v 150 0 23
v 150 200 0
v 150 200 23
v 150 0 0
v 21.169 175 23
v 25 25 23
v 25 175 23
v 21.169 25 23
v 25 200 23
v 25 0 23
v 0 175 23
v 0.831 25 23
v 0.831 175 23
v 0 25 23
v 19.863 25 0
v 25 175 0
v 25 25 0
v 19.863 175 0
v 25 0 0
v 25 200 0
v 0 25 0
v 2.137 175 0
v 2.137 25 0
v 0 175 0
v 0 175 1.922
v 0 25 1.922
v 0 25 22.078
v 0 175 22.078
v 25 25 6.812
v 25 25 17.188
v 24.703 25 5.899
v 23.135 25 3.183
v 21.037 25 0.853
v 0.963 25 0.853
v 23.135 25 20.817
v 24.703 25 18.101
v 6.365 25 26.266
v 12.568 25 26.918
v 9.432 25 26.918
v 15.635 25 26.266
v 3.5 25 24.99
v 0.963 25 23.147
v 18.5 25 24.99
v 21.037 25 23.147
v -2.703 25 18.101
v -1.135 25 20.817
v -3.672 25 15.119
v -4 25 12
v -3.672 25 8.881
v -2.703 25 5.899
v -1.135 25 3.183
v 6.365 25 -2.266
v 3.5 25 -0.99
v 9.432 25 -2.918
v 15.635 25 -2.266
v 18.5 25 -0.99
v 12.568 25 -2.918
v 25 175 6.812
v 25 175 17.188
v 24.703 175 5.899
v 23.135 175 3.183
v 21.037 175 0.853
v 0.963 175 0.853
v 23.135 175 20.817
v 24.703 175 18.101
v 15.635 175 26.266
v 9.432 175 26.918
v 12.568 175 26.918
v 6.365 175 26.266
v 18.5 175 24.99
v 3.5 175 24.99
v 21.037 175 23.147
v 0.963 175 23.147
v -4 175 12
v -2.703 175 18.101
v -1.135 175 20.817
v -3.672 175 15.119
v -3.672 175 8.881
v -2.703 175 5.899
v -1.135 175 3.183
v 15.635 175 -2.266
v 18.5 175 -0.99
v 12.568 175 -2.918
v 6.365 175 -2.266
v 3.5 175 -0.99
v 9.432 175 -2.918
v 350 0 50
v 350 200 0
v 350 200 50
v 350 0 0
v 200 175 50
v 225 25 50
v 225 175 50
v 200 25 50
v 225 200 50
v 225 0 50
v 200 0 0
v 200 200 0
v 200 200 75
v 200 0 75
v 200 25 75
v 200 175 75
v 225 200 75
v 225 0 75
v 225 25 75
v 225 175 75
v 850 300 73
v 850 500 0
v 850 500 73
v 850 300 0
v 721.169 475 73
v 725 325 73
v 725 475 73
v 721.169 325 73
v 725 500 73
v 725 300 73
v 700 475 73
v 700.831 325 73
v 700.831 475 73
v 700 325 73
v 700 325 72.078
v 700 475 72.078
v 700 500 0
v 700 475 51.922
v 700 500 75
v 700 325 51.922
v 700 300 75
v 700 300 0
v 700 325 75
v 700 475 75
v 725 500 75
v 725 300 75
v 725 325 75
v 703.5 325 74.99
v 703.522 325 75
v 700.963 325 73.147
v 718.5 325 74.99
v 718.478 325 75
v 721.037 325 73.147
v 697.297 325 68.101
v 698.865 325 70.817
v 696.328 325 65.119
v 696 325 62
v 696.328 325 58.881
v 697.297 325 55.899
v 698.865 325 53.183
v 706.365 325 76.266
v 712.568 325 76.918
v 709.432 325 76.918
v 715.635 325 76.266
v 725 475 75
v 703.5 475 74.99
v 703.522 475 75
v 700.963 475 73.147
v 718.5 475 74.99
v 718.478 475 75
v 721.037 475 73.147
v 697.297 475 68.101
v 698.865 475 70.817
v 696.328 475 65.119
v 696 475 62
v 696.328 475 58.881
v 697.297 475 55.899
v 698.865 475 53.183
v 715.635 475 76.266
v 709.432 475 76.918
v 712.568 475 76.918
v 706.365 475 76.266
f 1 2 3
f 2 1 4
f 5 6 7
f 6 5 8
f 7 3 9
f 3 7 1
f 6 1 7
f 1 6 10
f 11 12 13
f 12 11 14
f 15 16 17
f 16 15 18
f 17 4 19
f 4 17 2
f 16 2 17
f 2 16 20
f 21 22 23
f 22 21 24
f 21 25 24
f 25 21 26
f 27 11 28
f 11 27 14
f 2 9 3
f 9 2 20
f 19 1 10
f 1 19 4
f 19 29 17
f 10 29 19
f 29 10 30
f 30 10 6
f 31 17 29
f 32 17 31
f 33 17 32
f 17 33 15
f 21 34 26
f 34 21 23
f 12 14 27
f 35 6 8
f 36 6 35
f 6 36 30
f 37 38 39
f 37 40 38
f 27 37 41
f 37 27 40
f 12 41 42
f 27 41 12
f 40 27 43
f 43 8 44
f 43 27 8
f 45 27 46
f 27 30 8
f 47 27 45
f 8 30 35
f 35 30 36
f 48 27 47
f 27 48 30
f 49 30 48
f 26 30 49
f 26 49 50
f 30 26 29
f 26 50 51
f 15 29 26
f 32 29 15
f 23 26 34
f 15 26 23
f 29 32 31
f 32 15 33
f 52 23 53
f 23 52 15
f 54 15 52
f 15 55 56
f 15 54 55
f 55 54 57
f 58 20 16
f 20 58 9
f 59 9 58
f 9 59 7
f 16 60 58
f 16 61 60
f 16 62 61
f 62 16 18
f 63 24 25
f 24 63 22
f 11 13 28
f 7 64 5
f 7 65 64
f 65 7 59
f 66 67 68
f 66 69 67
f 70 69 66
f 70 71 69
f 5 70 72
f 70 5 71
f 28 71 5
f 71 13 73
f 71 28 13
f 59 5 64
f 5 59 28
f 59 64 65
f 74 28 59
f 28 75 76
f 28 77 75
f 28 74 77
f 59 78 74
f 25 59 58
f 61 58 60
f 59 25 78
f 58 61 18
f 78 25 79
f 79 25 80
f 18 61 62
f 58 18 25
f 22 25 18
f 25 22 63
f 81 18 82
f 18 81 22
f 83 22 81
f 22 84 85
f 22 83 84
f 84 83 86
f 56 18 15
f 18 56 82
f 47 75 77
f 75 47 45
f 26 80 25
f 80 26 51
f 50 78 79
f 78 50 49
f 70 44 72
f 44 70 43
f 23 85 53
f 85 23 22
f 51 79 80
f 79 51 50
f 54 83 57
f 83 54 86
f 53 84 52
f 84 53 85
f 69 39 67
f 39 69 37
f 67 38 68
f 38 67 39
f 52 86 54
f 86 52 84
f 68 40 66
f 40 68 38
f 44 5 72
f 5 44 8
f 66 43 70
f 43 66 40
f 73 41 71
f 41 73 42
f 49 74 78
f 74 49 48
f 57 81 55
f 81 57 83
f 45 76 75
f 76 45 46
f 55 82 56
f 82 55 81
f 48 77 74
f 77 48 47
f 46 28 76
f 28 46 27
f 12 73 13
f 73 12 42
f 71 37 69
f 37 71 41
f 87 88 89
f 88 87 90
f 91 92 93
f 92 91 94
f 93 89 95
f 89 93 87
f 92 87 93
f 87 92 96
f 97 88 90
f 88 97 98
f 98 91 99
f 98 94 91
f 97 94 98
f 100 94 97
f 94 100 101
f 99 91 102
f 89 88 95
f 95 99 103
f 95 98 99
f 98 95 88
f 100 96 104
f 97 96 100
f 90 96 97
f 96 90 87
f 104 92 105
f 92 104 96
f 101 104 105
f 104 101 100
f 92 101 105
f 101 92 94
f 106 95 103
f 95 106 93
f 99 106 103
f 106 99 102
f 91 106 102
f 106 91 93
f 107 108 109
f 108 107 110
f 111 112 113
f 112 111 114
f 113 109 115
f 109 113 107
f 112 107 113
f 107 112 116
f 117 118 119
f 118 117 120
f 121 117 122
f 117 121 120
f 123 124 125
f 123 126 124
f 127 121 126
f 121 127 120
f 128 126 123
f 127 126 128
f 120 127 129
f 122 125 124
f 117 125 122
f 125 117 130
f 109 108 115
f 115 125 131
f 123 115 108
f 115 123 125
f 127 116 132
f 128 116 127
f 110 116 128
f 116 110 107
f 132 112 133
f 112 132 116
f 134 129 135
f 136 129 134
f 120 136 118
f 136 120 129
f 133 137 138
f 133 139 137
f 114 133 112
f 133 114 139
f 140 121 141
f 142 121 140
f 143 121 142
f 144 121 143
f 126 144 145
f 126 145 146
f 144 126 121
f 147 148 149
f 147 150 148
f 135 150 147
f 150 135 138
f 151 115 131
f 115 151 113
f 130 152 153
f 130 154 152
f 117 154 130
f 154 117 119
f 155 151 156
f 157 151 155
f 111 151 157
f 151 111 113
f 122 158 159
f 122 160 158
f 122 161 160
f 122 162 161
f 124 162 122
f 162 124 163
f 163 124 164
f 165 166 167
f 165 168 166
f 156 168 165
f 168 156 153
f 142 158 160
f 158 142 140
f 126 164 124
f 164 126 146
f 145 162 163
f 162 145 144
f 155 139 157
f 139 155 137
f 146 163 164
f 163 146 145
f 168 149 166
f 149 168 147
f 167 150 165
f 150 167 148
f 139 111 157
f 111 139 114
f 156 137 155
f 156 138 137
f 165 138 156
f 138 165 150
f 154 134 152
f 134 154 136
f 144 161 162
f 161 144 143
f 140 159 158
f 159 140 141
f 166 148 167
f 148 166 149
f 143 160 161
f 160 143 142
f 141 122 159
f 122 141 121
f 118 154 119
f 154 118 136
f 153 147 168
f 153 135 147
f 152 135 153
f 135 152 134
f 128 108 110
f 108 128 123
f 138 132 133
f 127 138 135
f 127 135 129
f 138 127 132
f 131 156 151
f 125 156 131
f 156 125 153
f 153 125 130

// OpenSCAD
module lid() { //still need rod to connect lid to body
    
    difference() { //upper lid edge
        difference() {
            cube([150,200,23]);
            cube([25,25,25]);
            translate([0,175,0]){
                cube([25,25,25]);
            }
        }
        polyhedron(
            points=[ [25,5,23],[25,195,23],[145,5,23],[145,195,23], [25,0,18],[25,200,18],[150,0,18],[150,200,18], [25,0,23], [25,200,23], [150,0,23], [150,200,23] ],                             
            faces=[ [4,0,2,6],[6,2,3,7],[7,3,1,5],[0,8,4],[1,5,9],[0,2,10,8],[8,10,6,4],[2,3,11,10],[10,11,7,6],[11,3,1,9],[11,9,5,7],[0,2,6,4] ]
         );
    }
    union() { //rounded rear edge of lid
        translate([11,25,12]){
            rotate(a=270, v=[1,0,0]){
                cylinder(150,15,15,15);
            }
        }
    }
}

module body() { //still need holes in hinges
    difference() { //rounding so lid may rotate
        difference() { //base edge 
            translate([200,0,0]) {
                cube([150,200,50]);
            }
            polyhedron (
                points=[ [200,0,5],[200,200,5],[350,0,5],[350,200,5],[200,5,0],[200,195,0],[350,5,0],[350,195,0],[200,0,0],[200,200,0],[350,0,0],[350,200,0]
            ],
            faces=[ [0,2,10,8],[8,10,6,4],[1,0,8,9],[8,9,4,5],[3,1,9,11],[11,9,5,7],[2,3,11,10],[10,11,7,6],[0,2,6,4],[0,4,5,1],[1,5,7,3],[3,7,6,2]
            ]
            );
        }
        translate([210,25,65]){
            rotate(a=270, v=[1,0,0]){
                cylinder(150,15,15,15);
            }
        }
    }
    union(){
        translate([200,0,50]){
                cube([25,25,25]);
        }
        translate([200,175,50]){
                cube([25,25,25]);
        }
    }
}

lid();
body();

module laptop() {
    union() {
        translate([700,300,50]) {
            lid();
        }
        translate([500,300,0]) {
            body();
        }
    }
}

laptop();
